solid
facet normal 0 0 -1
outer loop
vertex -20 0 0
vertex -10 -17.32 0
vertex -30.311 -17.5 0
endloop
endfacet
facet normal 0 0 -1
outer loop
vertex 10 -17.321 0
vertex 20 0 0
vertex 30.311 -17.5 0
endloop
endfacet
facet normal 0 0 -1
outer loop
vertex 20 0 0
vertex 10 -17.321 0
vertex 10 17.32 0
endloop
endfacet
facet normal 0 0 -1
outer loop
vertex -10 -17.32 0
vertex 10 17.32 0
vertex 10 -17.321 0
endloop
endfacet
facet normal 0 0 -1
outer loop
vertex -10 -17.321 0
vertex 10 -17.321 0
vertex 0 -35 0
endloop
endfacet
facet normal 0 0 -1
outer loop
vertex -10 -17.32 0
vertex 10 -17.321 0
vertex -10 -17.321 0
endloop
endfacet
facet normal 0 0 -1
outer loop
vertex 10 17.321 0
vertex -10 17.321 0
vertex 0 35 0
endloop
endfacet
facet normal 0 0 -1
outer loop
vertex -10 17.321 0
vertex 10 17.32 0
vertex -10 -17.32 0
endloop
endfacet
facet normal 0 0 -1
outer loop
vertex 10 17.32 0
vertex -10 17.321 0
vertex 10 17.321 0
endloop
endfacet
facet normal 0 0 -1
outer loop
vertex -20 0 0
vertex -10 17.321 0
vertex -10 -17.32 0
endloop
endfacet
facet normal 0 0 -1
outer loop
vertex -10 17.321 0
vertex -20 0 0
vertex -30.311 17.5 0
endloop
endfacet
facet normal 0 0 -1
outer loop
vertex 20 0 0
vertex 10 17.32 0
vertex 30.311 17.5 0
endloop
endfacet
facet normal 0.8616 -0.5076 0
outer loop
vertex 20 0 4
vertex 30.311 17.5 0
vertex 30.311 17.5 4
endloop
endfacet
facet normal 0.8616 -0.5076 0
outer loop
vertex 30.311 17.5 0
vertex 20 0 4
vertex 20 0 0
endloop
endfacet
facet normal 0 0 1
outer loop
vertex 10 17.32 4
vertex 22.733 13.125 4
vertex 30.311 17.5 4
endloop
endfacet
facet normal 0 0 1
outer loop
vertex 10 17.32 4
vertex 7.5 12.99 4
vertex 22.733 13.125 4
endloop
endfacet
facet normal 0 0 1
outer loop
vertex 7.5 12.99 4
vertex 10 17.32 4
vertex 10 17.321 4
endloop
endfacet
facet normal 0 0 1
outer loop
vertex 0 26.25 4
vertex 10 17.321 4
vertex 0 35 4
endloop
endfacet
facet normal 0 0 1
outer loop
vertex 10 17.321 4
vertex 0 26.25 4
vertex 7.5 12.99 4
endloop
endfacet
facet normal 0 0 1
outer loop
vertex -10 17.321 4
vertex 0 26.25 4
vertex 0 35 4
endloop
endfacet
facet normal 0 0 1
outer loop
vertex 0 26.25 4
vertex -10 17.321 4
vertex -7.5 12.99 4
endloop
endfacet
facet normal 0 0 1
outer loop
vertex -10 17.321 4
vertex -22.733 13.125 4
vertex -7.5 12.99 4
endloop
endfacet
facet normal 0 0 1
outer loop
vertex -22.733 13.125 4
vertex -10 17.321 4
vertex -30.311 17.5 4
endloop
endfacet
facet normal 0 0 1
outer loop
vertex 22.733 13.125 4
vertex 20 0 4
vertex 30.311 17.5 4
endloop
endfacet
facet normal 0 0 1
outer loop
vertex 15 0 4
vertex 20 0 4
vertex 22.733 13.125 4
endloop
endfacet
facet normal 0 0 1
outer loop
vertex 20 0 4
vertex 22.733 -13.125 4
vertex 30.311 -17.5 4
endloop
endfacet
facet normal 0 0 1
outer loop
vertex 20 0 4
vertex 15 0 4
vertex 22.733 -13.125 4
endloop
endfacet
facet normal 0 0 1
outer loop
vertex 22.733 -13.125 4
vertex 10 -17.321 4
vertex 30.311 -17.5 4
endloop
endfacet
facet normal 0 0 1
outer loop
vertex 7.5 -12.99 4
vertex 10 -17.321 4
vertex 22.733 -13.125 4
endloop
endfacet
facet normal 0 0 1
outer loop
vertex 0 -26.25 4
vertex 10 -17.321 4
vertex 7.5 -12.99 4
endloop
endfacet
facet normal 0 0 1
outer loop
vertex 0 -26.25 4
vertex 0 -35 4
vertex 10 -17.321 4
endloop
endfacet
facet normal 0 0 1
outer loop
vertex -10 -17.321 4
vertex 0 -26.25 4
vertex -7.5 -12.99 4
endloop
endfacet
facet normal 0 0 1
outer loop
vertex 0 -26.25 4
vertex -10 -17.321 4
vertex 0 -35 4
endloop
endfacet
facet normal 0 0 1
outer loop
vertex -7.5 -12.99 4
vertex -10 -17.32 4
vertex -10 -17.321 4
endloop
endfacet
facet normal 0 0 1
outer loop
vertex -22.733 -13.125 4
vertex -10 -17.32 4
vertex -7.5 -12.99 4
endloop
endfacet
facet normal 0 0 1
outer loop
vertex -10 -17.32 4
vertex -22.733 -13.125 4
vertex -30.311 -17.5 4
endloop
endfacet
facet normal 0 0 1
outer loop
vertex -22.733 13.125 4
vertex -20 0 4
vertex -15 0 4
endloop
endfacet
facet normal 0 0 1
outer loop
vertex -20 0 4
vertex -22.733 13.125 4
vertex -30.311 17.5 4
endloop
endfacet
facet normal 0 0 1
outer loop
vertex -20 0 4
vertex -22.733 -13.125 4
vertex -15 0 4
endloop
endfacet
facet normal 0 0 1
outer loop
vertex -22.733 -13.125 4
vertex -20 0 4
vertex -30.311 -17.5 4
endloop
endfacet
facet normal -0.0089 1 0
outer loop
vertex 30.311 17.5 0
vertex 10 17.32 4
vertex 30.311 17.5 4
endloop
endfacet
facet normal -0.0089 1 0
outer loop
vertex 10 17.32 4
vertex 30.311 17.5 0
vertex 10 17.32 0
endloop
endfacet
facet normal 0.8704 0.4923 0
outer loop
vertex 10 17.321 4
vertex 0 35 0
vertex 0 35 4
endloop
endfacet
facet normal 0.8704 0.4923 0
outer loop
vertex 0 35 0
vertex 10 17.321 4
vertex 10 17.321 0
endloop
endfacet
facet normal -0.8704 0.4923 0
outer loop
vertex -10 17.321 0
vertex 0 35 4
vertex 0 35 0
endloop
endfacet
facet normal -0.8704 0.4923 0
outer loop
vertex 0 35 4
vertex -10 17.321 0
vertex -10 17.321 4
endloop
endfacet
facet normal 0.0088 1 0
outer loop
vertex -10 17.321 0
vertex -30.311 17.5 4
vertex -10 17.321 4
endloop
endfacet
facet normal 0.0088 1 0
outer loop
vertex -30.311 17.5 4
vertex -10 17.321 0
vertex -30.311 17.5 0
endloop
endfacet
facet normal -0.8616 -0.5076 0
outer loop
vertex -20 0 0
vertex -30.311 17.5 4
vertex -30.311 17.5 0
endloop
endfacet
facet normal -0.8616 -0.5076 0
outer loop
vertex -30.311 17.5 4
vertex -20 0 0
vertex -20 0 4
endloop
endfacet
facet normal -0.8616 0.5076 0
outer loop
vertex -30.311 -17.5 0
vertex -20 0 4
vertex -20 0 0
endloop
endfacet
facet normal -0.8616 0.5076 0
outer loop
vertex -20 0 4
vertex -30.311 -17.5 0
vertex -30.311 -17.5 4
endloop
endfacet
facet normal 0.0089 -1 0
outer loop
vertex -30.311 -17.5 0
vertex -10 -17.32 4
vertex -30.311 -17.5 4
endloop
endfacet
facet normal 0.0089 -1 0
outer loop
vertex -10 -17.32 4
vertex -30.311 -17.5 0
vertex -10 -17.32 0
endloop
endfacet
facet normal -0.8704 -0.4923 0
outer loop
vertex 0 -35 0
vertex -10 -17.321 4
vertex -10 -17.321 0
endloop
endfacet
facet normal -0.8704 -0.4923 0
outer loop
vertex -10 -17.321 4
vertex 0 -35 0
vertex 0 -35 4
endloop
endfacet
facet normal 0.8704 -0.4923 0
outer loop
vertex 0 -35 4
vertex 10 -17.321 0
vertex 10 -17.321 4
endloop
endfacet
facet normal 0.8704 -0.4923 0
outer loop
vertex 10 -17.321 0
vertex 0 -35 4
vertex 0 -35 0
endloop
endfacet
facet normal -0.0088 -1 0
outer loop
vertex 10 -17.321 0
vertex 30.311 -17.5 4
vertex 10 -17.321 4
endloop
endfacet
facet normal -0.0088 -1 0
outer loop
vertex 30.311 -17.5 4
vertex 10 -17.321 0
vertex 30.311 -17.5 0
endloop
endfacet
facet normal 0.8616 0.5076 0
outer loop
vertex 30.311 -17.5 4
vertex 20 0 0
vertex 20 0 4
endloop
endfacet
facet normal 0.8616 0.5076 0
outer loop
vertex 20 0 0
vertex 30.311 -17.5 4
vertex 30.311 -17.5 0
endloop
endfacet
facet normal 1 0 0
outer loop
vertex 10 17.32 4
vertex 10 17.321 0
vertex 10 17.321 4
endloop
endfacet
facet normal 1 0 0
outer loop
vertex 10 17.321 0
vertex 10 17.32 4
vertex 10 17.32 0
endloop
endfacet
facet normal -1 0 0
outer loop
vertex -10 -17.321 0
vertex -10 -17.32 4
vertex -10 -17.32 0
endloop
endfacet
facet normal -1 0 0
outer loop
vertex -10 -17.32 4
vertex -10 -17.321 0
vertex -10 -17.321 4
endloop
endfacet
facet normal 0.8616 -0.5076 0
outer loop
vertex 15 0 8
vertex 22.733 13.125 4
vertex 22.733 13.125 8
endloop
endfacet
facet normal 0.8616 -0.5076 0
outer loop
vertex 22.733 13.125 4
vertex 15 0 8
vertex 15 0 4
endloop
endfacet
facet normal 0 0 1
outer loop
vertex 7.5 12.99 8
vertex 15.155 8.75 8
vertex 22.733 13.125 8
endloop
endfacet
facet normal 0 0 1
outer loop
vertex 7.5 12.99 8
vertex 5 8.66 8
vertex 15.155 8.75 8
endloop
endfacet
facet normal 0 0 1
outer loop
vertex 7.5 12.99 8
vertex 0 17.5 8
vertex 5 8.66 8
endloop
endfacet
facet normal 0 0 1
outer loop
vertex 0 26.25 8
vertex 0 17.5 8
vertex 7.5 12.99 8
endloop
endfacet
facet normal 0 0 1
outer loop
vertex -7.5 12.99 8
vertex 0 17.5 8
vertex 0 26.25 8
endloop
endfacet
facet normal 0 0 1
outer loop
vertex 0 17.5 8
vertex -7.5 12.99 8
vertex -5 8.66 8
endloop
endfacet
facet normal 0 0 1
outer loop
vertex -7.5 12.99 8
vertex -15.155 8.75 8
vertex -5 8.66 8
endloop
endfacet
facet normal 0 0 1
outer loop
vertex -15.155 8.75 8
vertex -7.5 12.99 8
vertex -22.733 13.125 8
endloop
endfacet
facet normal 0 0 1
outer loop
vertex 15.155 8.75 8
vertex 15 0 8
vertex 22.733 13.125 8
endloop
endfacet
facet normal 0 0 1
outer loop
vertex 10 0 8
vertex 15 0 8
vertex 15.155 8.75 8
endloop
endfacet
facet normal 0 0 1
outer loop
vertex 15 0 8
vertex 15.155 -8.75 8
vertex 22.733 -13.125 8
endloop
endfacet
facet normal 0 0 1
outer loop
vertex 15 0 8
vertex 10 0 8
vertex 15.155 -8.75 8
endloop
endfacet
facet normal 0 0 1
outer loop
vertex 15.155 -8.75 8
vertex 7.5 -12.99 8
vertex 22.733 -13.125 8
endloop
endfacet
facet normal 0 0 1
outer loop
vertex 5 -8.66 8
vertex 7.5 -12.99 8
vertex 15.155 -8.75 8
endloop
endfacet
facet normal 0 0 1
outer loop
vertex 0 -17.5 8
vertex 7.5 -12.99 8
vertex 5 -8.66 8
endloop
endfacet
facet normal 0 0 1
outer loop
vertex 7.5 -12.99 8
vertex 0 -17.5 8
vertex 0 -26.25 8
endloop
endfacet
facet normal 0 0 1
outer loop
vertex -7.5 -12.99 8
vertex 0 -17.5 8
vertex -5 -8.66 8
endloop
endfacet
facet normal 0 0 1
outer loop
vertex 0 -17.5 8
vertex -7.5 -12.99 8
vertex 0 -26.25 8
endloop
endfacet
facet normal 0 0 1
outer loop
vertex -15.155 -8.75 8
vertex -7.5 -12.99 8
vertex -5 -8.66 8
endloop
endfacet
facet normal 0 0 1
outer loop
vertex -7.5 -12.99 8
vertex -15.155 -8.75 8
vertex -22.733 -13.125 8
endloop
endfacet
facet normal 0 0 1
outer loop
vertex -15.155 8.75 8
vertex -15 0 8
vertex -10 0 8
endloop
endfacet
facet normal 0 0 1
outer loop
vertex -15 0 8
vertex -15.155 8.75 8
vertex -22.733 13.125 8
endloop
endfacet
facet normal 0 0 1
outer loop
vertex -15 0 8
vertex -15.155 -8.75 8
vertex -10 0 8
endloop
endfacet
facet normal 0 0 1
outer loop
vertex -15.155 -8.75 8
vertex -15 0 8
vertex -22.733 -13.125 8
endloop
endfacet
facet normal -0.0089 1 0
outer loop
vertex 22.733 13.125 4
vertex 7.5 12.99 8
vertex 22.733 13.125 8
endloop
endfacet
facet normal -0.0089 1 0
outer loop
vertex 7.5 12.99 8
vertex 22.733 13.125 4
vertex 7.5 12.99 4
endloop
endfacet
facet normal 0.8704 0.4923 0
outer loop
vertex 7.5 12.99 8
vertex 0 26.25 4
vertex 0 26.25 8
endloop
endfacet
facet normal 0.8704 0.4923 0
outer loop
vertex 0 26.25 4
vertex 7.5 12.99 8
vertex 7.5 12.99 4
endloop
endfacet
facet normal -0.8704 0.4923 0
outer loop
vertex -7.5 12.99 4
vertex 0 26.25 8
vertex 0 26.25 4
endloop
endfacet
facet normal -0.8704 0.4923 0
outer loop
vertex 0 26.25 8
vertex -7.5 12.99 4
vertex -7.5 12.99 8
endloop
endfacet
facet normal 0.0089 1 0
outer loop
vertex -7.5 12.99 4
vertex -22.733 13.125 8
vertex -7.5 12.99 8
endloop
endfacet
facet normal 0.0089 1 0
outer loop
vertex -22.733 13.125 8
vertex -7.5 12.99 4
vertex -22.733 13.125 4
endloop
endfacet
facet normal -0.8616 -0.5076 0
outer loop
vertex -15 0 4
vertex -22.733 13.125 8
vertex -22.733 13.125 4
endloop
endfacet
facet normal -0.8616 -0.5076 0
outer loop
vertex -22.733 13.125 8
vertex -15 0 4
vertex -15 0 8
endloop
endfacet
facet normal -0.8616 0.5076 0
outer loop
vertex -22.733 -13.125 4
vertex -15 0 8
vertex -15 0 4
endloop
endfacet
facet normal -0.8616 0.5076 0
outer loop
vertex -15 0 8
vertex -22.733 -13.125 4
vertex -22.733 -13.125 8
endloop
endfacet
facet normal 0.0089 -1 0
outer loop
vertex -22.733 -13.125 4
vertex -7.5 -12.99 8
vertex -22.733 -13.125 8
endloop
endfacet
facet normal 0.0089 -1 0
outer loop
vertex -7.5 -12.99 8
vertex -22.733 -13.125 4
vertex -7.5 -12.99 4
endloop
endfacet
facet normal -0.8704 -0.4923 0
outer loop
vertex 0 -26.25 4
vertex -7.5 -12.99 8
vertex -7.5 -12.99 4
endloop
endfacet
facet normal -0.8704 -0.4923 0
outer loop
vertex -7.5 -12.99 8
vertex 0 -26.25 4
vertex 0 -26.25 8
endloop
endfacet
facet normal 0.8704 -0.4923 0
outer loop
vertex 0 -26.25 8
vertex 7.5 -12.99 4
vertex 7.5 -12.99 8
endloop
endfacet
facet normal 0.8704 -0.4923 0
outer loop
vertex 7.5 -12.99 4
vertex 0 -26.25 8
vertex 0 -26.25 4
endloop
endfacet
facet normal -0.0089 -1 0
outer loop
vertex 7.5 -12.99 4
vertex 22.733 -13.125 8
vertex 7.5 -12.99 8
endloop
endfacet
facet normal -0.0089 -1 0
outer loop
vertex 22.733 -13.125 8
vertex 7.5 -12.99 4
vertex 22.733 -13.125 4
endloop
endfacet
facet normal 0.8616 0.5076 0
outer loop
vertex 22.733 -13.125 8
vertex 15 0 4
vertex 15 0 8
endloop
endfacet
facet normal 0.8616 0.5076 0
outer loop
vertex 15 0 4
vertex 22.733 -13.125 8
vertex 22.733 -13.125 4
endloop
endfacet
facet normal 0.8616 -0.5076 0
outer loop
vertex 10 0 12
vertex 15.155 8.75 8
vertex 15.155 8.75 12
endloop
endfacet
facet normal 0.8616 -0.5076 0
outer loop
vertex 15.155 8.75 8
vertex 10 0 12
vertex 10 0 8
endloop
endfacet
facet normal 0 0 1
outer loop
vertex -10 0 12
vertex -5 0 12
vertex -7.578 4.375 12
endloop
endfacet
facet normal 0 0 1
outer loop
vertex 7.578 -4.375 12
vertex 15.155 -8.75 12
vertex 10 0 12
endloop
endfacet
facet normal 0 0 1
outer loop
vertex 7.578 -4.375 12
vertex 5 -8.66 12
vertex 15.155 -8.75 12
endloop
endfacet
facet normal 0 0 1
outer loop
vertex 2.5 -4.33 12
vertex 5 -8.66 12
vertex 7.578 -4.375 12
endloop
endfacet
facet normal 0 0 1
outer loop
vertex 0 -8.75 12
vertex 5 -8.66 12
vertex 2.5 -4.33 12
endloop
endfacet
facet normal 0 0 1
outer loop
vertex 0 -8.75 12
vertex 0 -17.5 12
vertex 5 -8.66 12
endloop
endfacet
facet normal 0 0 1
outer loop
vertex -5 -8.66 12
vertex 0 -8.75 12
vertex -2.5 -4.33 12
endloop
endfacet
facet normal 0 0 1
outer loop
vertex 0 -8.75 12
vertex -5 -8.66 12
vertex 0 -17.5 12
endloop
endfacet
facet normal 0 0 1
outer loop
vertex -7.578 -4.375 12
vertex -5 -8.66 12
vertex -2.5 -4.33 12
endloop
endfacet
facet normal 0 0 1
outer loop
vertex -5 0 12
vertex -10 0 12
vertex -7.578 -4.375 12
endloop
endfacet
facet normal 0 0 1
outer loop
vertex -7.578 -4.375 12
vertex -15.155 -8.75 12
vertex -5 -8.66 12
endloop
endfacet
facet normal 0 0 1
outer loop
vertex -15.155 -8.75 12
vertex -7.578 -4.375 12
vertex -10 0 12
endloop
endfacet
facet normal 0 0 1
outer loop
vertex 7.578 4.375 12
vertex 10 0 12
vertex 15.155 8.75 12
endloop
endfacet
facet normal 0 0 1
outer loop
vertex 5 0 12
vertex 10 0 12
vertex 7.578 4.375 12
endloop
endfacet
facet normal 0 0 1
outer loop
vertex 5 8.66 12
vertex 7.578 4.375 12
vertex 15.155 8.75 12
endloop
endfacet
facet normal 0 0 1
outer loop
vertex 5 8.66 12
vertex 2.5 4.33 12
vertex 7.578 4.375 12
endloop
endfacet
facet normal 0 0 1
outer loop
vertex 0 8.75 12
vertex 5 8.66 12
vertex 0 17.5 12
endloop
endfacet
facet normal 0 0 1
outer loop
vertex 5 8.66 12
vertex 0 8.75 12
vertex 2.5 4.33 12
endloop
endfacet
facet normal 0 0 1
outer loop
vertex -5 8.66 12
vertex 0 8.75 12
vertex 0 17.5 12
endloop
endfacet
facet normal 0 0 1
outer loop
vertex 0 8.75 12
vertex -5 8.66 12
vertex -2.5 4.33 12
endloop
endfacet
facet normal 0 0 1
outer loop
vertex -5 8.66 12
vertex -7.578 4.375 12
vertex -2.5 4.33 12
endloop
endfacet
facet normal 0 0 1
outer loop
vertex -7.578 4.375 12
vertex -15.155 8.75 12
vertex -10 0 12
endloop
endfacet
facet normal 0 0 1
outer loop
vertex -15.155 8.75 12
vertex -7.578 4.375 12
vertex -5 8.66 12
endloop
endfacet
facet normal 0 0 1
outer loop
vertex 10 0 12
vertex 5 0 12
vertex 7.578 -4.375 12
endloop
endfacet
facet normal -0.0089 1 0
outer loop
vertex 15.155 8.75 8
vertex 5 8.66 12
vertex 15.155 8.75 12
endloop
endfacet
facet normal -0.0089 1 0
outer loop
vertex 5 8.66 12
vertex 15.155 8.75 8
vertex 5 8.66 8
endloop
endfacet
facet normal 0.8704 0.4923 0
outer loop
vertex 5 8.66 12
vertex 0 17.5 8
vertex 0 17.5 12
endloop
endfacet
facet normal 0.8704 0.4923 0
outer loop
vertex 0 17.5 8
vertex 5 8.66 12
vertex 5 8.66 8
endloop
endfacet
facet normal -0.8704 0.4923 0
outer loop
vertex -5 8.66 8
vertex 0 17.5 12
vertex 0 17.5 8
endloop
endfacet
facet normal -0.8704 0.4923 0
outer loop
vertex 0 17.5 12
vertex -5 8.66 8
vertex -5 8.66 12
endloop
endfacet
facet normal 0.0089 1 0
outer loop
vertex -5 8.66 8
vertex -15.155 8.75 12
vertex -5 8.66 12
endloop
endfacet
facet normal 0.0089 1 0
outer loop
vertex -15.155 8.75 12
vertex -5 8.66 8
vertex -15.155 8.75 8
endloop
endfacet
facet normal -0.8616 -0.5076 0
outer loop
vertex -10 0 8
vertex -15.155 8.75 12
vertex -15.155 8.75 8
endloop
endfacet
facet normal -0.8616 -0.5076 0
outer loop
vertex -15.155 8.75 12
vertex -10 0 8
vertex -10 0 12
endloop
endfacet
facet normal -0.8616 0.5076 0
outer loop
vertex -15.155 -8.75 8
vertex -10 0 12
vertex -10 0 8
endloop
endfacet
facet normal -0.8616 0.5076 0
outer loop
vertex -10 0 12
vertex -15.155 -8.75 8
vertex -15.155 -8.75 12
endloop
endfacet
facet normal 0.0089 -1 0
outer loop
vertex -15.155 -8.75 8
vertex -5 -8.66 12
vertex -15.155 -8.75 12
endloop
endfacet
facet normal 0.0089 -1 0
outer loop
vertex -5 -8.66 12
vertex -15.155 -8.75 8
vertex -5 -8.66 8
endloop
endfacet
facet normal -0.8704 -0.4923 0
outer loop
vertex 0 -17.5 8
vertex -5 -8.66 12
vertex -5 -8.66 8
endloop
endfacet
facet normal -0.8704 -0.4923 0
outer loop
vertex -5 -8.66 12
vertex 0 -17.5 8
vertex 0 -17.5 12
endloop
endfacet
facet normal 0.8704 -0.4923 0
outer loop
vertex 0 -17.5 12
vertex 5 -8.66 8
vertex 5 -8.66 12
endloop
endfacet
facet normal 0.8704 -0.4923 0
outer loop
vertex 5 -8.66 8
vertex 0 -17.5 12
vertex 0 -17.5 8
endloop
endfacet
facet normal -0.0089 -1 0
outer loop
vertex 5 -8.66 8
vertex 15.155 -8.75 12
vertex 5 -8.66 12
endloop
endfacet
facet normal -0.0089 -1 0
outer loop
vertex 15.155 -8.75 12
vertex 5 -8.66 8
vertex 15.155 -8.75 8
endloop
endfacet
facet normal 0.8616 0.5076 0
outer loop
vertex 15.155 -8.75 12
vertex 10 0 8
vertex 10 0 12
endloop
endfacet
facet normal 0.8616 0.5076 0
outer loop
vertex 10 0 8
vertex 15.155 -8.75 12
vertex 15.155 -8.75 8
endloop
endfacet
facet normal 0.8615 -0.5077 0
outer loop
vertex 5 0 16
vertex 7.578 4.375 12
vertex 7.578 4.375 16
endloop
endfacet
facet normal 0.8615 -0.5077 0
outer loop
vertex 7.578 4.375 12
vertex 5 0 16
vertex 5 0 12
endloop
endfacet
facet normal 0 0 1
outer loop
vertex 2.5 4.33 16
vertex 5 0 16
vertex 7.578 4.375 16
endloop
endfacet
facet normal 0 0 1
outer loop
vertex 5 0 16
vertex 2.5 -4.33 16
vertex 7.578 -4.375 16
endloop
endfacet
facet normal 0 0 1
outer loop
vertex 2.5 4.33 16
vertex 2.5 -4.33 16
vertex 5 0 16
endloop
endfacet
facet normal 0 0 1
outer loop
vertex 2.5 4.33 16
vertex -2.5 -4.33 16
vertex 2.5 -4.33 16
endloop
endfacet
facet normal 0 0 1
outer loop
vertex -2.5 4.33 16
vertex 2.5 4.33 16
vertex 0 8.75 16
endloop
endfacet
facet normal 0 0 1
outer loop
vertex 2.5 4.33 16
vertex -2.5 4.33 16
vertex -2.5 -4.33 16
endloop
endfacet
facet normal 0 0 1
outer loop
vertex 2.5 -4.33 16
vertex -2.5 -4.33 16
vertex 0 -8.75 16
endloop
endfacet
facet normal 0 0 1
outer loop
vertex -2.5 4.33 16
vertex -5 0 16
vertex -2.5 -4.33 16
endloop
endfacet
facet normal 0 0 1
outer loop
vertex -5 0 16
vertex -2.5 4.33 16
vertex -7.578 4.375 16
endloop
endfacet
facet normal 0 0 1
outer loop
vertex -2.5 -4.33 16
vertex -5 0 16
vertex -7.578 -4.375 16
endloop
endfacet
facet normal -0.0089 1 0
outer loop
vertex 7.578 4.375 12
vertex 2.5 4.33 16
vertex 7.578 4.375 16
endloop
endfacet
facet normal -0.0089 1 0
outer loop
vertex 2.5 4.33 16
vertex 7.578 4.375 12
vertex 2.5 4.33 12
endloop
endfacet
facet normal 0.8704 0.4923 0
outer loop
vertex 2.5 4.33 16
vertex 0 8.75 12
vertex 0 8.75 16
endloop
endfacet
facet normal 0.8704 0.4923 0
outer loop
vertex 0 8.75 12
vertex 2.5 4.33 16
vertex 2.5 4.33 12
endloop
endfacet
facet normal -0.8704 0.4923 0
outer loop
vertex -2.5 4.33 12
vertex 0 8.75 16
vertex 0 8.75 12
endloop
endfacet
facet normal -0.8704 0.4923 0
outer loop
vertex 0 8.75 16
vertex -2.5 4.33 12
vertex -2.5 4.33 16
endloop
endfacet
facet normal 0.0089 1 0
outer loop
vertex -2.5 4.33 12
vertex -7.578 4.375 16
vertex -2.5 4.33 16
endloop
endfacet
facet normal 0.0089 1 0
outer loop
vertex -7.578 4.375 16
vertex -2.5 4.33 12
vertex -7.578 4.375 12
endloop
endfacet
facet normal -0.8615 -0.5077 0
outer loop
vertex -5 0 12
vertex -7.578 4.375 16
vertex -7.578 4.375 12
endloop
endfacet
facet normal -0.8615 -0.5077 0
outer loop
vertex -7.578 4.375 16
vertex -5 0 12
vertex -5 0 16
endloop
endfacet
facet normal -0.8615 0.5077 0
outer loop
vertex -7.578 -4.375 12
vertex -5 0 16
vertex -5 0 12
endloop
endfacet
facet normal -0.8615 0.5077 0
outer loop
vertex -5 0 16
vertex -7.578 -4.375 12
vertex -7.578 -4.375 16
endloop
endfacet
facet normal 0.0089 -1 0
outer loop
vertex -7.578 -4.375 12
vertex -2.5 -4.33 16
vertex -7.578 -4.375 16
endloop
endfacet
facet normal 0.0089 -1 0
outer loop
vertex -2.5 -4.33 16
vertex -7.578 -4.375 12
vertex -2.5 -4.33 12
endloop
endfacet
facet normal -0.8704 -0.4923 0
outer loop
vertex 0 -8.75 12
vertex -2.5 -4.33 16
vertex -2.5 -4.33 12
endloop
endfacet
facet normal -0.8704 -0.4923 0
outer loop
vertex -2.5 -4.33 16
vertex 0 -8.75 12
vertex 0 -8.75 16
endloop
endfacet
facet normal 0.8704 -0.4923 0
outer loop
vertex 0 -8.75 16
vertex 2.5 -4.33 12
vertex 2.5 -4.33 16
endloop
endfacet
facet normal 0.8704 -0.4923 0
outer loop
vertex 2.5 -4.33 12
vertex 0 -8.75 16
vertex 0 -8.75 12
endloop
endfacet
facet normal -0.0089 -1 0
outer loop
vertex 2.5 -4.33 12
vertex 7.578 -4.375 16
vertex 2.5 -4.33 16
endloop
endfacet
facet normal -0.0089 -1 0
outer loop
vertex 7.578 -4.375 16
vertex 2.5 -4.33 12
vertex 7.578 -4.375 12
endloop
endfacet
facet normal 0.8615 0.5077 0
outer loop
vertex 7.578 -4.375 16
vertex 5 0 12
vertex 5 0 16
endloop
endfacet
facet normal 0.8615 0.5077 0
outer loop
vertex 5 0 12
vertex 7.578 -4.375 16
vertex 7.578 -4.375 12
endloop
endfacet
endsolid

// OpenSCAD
module gear(height, radius, teeth_depth, teeth=30) {
	cylinder(h=height, r=radius, $fn=teeth);
	for(tooth = [0 : teeth]) {
		rotate([0, 0, tooth * 360 / teeth]) {
			linear_extrude(height=height) {
				polygon(points=[[radius, 0], [cos(360 / teeth) * radius, sin(360 / teeth) * radius], [cos(180 / teeth) * (radius + teeth_depth), sin(180 / teeth) * (radius + teeth_depth)]], convexity=1);
			}
		}
	}
}

gear(height=4, radius=20, teeth_depth=15, teeth=6);
gear(height=8, radius=20 * 0.75, teeth_depth=15 * 0.75, teeth=6);
gear(height=12, radius=20 * 0.5, teeth_depth=15 * 0.5, teeth=6);
gear(height=16, radius=20 * 0.25, teeth_depth=15 * 0.25, teeth=6);
